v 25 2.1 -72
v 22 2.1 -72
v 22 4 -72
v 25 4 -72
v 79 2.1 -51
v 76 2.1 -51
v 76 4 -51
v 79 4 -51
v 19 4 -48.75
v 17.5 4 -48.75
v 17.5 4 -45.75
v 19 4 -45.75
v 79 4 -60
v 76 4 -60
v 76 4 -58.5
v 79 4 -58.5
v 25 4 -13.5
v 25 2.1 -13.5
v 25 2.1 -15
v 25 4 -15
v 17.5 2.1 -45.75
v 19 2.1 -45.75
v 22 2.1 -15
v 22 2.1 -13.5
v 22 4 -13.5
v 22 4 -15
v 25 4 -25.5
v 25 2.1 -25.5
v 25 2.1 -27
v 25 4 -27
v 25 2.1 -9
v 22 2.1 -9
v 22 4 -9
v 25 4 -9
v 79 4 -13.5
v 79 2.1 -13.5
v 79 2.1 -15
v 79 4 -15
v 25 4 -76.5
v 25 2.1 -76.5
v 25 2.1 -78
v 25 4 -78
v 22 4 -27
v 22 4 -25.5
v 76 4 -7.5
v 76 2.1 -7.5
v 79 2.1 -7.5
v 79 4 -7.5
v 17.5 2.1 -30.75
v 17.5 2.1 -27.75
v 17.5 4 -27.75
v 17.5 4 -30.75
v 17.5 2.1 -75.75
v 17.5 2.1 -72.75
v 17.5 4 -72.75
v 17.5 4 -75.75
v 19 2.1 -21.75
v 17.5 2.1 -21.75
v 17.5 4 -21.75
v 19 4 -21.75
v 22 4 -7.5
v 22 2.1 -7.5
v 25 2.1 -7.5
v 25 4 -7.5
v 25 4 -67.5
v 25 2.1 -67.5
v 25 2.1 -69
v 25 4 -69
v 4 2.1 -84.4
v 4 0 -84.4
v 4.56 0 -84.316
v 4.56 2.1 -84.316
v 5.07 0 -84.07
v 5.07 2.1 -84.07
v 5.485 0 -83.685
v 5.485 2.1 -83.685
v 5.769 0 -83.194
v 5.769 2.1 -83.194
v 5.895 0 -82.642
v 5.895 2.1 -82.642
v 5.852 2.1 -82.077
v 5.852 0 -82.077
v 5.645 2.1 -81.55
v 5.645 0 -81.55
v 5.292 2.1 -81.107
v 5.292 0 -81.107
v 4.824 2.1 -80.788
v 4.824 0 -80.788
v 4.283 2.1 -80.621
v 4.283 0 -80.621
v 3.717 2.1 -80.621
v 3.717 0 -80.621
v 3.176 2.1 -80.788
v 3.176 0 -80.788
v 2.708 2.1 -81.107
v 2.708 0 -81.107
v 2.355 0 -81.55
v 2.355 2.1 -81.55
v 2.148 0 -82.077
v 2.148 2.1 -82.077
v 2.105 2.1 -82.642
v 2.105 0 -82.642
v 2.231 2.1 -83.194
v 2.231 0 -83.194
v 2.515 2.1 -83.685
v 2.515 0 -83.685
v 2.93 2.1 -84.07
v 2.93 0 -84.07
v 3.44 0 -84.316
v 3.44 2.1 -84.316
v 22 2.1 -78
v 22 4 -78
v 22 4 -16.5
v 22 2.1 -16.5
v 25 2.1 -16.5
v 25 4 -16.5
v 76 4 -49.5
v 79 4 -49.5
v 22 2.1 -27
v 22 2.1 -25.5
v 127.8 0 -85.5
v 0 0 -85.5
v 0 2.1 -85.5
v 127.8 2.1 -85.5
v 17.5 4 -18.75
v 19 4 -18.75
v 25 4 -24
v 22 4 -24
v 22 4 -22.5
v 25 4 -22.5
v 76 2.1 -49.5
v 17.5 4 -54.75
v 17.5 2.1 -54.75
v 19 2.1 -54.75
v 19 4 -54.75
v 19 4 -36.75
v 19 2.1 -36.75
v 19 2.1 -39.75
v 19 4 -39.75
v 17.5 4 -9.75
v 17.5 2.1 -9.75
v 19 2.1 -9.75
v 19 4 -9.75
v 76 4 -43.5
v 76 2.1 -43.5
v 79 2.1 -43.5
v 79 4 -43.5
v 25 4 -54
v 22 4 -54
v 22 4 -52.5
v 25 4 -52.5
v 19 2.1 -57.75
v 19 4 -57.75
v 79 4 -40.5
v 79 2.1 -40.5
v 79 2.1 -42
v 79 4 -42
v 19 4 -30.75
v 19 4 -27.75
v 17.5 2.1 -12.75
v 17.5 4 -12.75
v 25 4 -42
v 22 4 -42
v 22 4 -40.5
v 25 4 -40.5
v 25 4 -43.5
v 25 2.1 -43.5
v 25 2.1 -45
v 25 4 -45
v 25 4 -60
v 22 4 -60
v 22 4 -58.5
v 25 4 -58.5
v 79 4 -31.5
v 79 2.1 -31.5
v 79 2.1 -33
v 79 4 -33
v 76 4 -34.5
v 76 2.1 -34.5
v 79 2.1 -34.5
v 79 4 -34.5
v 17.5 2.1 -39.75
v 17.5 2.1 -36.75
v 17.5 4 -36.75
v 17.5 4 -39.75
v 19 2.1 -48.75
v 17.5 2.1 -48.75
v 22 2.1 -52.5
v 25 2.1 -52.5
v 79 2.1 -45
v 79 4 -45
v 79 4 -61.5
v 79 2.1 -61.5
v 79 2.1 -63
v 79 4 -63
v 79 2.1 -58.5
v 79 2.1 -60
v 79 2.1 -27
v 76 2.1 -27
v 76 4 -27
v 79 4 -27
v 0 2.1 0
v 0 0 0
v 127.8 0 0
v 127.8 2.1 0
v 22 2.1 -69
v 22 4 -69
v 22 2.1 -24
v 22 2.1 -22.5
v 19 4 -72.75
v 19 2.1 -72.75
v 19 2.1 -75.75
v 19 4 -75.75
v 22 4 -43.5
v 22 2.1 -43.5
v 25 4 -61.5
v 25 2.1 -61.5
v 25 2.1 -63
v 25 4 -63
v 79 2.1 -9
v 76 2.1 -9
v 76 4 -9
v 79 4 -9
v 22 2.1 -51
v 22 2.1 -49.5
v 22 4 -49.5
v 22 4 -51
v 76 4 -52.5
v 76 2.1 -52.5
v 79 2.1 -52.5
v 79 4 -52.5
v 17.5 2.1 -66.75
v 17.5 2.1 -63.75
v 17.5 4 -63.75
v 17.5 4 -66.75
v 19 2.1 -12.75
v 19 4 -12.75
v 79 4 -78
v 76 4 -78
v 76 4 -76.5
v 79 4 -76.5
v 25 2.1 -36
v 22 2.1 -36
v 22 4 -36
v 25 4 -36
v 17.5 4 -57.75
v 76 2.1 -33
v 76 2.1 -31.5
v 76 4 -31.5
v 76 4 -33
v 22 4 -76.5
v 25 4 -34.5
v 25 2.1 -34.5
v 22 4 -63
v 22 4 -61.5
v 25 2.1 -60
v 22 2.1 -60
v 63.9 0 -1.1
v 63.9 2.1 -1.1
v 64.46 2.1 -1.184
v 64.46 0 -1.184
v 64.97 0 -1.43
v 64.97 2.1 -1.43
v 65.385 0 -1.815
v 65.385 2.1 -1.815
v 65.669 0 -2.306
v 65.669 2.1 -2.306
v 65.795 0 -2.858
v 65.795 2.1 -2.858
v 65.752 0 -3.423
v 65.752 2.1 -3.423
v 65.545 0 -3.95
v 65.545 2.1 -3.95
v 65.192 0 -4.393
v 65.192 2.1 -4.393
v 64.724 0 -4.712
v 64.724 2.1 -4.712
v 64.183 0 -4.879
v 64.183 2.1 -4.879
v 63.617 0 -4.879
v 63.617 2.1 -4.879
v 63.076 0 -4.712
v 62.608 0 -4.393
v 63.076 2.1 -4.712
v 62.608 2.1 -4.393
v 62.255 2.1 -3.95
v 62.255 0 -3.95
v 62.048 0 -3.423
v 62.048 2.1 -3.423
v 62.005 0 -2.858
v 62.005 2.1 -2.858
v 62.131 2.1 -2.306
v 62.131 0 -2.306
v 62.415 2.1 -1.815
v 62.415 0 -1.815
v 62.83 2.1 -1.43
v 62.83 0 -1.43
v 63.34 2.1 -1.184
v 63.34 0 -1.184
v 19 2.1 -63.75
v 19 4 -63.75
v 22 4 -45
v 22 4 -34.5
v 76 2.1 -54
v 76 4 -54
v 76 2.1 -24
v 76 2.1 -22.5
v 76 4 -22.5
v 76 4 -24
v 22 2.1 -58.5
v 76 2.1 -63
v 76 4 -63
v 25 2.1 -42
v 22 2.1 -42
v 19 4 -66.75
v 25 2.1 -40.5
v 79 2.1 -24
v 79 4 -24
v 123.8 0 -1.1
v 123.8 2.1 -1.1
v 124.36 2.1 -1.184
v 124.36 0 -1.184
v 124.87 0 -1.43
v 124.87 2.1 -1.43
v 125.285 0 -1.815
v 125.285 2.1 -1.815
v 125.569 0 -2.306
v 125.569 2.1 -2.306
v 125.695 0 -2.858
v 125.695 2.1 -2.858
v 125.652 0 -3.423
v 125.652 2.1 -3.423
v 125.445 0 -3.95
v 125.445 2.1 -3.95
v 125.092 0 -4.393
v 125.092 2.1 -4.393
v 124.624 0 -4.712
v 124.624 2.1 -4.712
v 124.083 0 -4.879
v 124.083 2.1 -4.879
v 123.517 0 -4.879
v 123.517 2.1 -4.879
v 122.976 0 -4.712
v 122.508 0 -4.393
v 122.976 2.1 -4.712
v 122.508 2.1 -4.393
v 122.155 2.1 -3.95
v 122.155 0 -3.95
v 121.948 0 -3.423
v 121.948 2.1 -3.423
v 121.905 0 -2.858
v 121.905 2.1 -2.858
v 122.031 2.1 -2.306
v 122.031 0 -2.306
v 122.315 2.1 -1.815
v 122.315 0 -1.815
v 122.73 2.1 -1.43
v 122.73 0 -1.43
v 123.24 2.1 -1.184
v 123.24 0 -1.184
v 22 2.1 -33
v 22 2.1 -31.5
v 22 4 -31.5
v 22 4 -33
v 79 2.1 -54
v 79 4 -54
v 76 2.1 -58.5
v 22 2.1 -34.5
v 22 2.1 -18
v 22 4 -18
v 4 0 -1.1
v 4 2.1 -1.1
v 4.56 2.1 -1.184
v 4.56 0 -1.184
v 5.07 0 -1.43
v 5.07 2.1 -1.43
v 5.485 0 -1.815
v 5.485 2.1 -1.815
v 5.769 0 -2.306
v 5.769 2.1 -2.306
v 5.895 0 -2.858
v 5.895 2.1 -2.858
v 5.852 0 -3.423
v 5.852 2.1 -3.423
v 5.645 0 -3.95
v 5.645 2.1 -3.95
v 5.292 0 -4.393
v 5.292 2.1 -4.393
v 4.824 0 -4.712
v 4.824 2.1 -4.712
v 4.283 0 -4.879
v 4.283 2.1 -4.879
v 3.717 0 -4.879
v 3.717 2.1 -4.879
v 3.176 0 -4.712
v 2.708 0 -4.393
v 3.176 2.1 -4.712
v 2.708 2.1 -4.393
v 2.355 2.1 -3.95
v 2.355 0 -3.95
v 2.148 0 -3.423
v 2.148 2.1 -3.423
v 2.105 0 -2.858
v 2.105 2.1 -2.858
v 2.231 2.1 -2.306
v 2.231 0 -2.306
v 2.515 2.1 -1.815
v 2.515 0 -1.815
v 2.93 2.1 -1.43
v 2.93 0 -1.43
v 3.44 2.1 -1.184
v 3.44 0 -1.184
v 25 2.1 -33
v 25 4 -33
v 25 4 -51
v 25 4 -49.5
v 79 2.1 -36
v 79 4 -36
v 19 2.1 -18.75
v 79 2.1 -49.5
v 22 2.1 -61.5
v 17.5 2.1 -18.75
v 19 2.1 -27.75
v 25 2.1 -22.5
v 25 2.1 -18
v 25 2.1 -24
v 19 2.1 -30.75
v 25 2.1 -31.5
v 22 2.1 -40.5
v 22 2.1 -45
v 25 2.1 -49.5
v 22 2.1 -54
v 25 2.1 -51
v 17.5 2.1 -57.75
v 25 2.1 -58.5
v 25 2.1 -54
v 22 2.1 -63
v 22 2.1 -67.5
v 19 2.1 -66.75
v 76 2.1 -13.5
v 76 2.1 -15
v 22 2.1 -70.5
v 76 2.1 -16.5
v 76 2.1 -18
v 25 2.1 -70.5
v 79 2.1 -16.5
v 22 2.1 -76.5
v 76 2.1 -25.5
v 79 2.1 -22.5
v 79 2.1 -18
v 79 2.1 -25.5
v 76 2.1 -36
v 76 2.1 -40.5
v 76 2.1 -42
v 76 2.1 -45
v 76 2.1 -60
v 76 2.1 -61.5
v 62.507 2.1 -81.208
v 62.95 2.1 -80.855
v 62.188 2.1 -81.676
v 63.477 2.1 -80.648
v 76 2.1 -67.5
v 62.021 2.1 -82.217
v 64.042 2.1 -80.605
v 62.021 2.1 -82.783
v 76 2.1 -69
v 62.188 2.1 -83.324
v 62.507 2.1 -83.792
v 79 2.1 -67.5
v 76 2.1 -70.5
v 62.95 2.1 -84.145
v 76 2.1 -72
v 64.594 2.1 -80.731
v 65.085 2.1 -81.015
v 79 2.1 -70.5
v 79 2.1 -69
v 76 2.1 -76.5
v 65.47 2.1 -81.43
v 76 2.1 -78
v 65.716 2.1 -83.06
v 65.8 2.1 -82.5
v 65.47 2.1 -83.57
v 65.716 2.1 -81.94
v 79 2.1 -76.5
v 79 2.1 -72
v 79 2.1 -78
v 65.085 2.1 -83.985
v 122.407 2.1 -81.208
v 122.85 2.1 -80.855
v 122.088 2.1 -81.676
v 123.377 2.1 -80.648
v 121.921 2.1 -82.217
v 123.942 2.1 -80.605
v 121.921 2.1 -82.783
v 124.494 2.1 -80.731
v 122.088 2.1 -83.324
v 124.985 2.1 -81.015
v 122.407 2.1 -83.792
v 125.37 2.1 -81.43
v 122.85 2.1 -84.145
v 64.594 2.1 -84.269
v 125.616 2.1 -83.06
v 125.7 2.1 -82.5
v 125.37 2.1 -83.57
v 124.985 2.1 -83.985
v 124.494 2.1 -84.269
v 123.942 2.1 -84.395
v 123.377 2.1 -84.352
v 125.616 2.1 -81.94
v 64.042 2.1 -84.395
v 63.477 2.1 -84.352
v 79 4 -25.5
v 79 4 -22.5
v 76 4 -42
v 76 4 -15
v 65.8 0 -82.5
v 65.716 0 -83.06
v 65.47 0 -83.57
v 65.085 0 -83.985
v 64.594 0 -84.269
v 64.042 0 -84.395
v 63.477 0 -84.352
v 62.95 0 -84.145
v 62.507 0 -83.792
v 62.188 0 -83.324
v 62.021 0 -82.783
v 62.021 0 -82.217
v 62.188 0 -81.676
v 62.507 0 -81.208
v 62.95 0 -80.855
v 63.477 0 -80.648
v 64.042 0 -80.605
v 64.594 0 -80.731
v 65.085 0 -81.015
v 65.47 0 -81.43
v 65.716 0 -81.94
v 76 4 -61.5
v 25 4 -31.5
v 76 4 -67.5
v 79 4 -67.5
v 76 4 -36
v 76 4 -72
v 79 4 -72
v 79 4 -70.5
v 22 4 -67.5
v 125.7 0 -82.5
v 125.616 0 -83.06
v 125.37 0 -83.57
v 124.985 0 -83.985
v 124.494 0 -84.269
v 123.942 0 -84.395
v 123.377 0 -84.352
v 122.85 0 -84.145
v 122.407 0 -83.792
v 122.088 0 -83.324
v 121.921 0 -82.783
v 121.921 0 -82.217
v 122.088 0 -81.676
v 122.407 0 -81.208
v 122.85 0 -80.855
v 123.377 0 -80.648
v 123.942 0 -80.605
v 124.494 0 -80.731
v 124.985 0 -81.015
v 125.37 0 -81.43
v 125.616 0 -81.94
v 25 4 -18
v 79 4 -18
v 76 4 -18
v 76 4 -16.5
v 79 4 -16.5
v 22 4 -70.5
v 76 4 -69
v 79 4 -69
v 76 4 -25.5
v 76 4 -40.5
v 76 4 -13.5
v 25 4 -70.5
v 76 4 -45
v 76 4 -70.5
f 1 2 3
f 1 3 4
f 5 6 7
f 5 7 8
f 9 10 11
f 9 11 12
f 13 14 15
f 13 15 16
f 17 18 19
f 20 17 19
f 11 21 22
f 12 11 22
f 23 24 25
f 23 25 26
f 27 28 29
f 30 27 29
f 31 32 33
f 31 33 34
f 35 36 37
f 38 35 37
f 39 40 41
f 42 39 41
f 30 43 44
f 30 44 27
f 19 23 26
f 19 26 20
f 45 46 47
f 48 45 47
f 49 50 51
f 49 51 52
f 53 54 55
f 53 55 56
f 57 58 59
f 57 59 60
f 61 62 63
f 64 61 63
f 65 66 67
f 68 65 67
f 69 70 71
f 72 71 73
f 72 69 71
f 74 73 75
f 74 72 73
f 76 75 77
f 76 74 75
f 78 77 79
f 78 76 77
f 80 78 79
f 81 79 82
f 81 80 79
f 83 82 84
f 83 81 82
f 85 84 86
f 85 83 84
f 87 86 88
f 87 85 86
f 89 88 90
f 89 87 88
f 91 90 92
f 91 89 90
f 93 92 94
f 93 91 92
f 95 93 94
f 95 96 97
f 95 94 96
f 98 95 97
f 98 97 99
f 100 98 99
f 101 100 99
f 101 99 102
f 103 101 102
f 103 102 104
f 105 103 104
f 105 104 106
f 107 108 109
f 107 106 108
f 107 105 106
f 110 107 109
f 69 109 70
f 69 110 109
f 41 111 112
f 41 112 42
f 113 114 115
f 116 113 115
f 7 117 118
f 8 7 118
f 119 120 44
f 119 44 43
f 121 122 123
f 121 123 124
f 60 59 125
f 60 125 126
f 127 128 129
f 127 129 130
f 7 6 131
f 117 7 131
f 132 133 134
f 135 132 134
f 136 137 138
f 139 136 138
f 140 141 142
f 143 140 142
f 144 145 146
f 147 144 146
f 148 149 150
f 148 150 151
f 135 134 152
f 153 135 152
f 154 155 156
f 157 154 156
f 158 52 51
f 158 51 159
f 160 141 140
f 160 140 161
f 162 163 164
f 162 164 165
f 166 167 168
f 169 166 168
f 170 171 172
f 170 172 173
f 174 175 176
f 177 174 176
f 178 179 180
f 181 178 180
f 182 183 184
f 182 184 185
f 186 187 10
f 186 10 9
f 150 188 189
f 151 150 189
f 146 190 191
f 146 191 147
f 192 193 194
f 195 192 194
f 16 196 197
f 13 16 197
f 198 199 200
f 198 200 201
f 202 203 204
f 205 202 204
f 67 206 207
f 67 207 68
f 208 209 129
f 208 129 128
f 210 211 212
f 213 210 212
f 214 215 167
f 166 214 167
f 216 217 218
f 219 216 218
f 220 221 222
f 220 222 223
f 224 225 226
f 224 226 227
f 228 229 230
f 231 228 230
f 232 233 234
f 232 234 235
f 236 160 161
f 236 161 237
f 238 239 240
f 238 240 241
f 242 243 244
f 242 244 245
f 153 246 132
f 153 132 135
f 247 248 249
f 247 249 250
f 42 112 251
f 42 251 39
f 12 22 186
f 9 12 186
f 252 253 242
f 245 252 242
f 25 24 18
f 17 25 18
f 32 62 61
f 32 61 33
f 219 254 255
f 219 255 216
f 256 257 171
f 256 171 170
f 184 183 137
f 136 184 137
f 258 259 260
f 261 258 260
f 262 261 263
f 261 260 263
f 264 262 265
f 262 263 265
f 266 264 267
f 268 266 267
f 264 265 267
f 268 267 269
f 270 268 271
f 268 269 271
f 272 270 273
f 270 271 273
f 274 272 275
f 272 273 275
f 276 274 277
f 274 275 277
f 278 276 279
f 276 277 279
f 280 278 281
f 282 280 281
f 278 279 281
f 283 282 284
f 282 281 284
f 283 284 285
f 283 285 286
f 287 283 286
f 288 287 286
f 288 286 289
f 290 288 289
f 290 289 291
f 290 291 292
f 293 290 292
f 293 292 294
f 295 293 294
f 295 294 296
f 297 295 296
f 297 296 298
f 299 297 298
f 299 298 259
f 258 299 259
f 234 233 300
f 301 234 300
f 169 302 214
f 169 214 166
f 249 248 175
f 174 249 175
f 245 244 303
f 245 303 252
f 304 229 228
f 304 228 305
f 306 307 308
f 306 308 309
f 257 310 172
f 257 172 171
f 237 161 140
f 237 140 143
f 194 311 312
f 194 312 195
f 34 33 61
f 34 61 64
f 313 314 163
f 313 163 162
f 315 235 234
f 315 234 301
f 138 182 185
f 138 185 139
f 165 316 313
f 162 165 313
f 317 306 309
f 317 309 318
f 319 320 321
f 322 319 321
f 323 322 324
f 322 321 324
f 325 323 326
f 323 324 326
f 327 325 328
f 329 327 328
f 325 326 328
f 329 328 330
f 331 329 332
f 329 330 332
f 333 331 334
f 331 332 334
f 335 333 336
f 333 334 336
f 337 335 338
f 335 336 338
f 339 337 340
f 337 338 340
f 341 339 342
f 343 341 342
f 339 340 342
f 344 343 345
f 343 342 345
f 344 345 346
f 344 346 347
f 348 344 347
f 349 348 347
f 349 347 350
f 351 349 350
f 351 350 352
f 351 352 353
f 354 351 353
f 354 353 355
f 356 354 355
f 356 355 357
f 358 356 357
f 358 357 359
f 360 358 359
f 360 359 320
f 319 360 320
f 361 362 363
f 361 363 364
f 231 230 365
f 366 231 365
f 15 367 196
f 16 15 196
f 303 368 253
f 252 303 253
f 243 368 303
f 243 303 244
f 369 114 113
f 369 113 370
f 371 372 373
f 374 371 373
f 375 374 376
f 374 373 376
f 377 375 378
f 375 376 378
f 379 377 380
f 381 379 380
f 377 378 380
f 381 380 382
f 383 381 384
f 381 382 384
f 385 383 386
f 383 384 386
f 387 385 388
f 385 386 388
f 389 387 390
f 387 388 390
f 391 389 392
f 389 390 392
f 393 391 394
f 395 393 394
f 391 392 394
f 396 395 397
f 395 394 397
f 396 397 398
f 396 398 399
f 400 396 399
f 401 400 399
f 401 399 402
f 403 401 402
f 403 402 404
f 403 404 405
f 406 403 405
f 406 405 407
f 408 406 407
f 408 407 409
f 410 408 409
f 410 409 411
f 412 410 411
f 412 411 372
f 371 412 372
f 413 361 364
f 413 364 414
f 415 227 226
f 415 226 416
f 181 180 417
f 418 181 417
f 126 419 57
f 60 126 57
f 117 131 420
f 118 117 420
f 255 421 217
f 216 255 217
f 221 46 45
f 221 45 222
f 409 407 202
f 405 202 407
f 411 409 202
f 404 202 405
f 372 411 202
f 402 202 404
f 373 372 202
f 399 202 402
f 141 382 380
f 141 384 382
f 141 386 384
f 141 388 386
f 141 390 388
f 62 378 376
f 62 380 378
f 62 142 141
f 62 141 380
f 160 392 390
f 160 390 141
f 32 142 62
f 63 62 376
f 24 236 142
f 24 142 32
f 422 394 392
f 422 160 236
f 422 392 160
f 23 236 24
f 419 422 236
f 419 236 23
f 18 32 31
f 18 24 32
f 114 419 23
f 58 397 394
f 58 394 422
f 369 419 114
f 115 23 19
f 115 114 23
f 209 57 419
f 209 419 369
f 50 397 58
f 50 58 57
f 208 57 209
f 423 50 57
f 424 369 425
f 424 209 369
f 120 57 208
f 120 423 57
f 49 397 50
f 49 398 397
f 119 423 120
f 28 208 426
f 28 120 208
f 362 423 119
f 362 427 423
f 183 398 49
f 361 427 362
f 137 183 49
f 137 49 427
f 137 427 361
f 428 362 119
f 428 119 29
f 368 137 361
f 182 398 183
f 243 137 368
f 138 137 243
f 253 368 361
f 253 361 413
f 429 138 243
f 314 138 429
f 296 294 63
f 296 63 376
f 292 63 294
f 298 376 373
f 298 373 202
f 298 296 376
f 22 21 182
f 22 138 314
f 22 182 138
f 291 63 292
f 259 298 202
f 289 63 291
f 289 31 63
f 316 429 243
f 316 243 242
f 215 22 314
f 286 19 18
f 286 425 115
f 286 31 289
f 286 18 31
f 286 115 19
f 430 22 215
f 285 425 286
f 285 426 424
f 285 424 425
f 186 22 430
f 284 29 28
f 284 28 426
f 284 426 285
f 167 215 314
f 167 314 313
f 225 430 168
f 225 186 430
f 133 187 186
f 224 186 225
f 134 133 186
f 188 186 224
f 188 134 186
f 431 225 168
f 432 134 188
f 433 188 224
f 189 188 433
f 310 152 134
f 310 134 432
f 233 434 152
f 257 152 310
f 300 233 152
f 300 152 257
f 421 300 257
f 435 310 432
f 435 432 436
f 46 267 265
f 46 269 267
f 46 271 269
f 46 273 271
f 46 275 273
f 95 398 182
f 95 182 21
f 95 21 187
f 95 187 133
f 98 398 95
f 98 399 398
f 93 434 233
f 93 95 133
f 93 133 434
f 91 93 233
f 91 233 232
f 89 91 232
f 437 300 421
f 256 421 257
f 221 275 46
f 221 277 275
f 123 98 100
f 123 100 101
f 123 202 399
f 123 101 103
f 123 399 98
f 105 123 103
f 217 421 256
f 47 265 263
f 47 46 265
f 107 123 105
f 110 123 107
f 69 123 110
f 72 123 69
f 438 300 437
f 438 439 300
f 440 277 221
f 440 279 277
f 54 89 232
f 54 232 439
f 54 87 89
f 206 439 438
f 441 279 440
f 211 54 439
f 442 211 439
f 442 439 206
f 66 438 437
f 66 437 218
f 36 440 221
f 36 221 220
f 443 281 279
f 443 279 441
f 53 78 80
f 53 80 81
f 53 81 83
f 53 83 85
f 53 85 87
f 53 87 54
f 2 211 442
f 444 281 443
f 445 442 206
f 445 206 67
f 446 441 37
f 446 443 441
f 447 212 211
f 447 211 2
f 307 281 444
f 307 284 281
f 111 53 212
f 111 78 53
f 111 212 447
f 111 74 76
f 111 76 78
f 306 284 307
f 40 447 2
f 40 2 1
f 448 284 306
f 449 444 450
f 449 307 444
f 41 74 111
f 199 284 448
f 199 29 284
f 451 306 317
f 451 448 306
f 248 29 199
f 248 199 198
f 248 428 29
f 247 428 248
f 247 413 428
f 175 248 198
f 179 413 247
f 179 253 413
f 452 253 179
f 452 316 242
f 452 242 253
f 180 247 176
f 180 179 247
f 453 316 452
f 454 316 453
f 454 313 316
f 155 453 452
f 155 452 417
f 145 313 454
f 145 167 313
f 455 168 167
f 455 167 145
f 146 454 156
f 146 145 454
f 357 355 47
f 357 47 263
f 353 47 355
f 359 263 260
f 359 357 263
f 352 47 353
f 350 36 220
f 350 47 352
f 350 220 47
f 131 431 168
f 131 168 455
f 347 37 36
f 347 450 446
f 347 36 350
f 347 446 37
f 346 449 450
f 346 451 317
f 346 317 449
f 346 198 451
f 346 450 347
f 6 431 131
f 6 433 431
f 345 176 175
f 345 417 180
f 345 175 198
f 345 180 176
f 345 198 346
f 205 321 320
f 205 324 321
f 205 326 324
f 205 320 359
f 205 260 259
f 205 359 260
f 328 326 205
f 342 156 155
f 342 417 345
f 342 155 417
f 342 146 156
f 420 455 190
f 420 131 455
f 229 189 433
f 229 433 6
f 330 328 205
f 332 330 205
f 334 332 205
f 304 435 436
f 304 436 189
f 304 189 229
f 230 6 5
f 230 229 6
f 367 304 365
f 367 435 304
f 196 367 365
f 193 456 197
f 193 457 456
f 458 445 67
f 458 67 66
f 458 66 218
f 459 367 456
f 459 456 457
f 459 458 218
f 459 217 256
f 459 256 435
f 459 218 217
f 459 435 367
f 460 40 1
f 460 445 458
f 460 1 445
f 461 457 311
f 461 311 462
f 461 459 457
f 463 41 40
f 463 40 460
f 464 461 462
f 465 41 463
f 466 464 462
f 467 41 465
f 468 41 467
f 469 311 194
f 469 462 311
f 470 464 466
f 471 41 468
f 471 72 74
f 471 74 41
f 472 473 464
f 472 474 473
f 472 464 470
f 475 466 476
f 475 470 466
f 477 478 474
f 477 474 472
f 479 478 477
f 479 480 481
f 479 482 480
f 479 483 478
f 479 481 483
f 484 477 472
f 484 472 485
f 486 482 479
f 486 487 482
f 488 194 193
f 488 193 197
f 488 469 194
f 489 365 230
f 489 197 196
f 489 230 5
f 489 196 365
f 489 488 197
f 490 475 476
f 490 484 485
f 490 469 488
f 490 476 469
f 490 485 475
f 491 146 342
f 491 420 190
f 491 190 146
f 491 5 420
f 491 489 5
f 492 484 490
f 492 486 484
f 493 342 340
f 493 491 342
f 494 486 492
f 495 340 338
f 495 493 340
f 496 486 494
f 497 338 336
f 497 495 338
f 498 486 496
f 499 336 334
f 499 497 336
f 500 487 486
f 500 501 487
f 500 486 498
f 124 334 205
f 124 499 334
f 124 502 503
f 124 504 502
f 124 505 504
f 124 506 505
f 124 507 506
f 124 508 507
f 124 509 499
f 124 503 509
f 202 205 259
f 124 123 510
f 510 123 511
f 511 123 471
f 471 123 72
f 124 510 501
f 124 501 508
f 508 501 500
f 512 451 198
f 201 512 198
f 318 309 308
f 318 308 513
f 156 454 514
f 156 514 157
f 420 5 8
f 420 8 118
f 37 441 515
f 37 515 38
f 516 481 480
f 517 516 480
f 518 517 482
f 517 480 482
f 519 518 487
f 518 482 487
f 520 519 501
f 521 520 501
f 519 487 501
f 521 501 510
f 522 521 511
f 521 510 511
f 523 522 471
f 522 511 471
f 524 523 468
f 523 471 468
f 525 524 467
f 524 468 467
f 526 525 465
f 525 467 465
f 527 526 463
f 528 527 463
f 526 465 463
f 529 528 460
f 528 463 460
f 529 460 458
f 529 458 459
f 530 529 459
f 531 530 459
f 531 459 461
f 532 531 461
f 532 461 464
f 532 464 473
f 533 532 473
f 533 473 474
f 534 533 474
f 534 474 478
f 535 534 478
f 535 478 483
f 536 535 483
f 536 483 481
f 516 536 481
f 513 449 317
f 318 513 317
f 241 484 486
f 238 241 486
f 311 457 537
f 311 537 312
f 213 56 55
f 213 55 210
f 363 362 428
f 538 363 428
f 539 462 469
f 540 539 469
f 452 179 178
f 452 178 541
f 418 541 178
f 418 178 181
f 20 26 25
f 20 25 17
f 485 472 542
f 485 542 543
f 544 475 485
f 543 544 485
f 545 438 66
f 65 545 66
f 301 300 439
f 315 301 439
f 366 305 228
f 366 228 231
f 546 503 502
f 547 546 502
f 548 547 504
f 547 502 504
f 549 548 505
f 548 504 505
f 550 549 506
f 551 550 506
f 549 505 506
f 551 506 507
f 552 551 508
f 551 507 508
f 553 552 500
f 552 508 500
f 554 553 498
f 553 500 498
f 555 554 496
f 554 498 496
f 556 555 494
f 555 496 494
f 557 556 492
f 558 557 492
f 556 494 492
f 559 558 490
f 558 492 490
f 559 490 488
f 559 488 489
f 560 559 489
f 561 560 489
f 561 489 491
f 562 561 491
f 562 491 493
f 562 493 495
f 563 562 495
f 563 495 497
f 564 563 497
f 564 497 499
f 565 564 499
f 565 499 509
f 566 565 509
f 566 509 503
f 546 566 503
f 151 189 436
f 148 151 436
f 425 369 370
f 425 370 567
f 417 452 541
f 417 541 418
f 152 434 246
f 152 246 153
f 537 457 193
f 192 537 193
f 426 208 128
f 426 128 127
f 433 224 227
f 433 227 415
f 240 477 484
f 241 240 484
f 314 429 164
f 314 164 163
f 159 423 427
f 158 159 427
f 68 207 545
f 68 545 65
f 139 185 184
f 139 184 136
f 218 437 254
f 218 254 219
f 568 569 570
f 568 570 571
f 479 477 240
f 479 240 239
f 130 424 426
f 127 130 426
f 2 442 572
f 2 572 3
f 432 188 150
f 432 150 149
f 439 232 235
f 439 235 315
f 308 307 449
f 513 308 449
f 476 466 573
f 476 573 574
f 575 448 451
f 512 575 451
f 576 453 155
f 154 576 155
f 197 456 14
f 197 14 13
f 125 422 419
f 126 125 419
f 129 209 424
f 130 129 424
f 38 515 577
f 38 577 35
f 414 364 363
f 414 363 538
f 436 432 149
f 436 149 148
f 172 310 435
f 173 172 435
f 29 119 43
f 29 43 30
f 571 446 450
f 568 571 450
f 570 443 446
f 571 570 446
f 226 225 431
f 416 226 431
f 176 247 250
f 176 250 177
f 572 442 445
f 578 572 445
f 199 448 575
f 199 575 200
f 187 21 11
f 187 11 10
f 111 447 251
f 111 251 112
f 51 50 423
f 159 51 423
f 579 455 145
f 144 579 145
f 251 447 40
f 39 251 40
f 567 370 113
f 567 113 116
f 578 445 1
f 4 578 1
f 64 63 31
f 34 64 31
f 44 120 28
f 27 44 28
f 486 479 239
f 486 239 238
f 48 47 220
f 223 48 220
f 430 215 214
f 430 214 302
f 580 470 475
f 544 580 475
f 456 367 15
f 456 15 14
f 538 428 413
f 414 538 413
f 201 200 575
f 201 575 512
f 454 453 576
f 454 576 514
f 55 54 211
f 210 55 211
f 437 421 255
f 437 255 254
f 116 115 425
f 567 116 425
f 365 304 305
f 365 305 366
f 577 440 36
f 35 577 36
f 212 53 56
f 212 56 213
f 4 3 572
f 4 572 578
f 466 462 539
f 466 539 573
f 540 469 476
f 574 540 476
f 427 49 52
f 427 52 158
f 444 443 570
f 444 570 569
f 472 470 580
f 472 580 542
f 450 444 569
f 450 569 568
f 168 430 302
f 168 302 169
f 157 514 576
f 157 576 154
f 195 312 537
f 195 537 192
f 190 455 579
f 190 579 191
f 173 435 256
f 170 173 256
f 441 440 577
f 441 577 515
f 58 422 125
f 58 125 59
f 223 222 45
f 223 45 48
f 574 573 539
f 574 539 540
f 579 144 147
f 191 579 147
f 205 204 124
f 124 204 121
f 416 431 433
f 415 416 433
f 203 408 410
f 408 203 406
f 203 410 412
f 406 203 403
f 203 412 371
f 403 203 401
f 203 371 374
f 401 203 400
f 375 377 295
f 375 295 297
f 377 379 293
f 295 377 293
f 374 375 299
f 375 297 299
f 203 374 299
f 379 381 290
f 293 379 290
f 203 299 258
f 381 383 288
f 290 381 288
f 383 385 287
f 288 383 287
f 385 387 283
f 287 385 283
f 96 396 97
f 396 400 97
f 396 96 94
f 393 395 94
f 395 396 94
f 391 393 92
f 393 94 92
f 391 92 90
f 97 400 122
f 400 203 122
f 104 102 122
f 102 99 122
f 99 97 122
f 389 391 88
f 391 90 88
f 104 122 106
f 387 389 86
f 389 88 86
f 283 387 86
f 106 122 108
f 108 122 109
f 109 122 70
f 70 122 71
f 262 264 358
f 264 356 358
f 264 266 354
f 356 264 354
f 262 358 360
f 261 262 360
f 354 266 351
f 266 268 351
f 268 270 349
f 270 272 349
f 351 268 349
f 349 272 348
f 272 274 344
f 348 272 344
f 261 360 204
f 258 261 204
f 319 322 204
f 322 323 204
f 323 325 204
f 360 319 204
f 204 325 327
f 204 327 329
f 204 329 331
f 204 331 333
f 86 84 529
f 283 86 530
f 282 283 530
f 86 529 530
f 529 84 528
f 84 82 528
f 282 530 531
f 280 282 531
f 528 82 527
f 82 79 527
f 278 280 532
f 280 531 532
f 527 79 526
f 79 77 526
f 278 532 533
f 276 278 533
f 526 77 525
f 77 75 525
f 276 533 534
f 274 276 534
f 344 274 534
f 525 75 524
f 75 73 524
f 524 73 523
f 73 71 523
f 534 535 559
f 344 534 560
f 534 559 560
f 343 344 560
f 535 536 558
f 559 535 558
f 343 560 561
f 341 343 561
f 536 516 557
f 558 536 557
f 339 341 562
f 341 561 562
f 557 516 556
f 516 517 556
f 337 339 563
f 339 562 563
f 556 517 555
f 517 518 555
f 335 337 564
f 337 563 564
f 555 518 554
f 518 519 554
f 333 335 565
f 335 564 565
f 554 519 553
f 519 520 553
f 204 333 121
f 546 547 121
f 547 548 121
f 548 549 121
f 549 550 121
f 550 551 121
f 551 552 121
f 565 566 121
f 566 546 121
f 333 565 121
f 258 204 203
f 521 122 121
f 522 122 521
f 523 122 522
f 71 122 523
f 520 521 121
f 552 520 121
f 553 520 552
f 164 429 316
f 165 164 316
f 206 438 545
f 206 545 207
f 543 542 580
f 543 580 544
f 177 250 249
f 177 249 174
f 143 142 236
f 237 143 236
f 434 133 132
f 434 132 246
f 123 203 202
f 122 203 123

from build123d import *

# Parameters (mm, degrees)
SKETCH1_W                 = 127.8
SKETCH1_H                 = 85.5
BOSS_EXTRUDE1_DEPTH       = 2.1
SKETCH2_R                 = 1.9
CUT_EXTRUDE1_DEPTH        = 154.777436576
LPATTERN1_COUNT           = 3
LPATTERN1_PITCH           = 59.9
MIRROR1_COPY_1_SKETCH_R   = 1.9
MIRROR1_COPY_1_DEPTH      = 154.777436576
MIRROR1_COPY_2_SKETCH_R   = 1.9
MIRROR1_COPY_2_DEPTH      = 154.777436576
SKETCH3_W                 = 3
SKETCH3_H                 = 1.5
BOSS_EXTRUDE2_DEPTH       = 1.9
LPATTERN2_COUNT           = 4
LPATTERN2_PITCH           = 9
MIRROR2_COPY_1_SKETCH_W   = 3
MIRROR2_COPY_1_SKETCH_H   = 1.5
MIRROR2_COPY_1_DEPTH      = 1.9
MIRROR2_COPY_2_SKETCH_W   = 3
MIRROR2_COPY_2_SKETCH_H   = 1.5
MIRROR2_COPY_2_DEPTH      = 1.9
MIRROR2_COPY_3_SKETCH_W   = 3
MIRROR2_COPY_3_SKETCH_H   = 1.5
MIRROR2_COPY_3_DEPTH      = 1.9
LPATTERN3_COUNT           = 2
LPATTERN3_PITCH           = 54
LPATTERN3_COPY_1_SKETCH_W = 3
LPATTERN3_COPY_1_SKETCH_H = 1.5
LPATTERN3_COPY_1_DEPTH    = 1.9
LPATTERN3_COPY_2_SKETCH_W = 3
LPATTERN3_COPY_2_SKETCH_H = 1.5
LPATTERN3_COPY_2_DEPTH    = 1.9
LPATTERN3_COPY_3_SKETCH_W = 3
LPATTERN3_COPY_3_SKETCH_H = 1.5
LPATTERN3_COPY_3_DEPTH    = 1.9
LPATTERN3_COPY_4_SKETCH_W = 3
LPATTERN3_COPY_4_SKETCH_H = 1.5
LPATTERN3_COPY_4_DEPTH    = 1.9
LPATTERN3_COPY_5_SKETCH_W = 3
LPATTERN3_COPY_5_SKETCH_H = 1.5
LPATTERN3_COPY_5_DEPTH    = 1.9
LPATTERN3_COPY_6_SKETCH_W = 3
LPATTERN3_COPY_6_SKETCH_H = 1.5
LPATTERN3_COPY_6_DEPTH    = 1.9
LPATTERN3_COPY_7_SKETCH_W = 3
LPATTERN3_COPY_7_SKETCH_H = 1.5
LPATTERN3_COPY_7_DEPTH    = 1.9
SKETCH4_W                 = 1.5
SKETCH4_H                 = 3
BOSS_EXTRUDE3_DEPTH       = 1.9
LPATTERN4_COUNT           = 8
LPATTERN4_PITCH           = 9


with BuildPart() as part:
    # Sketch1 → Boss-Extrude1 (new body)
    with BuildSketch(Plane(origin=(0, 0, 0), x_dir=(1, 0, 0), z_dir=(0, 1, 0))):
        with Locations((63.9, 42.75)):
            Rectangle(SKETCH1_W, SKETCH1_H)
    extrude(amount=BOSS_EXTRUDE1_DEPTH)

    # Sketch2 → Cut-Extrude1 (cut, through all)
    with BuildSketch(Plane(origin=(0, 2.1, 0), x_dir=(1, 0, 0), z_dir=(0, 1, 0))):
        with Locations(Location((4, 3, 0), (0, 0, 270))):
            Circle(SKETCH2_R)
    cut_extrude1 = extrude(amount=-CUT_EXTRUDE1_DEPTH, mode=Mode.SUBTRACT)

    # LPattern1: Cut-Extrude1 ×3
    with Locations(*[(i * LPATTERN1_PITCH, 0, 0) for i in range(1, LPATTERN1_COUNT)]):
        add(cut_extrude1, mode=Mode.SUBTRACT)

    # Mirror1: Cut-Extrude1 across plane
    add(cut_extrude1.mirror(Plane.XY.offset(-42.75)), mode=Mode.SUBTRACT)

    # Mirror1 copy 1 sketch → Mirror1 copy 1 (cut, through all)
    with BuildSketch(Plane(origin=(59.9, 2.1, -85.5), x_dir=(1, 0, 0), z_dir=(0, 1, 0))):
        with Locations((4, -3)):
            Circle(MIRROR1_COPY_1_SKETCH_R)
    extrude(amount=-MIRROR1_COPY_1_DEPTH, mode=Mode.SUBTRACT)

    # Mirror1 copy 2 sketch → Mirror1 copy 2 (cut, through all)
    with BuildSketch(Plane(origin=(119.8, 2.1, -85.5), x_dir=(1, 0, 0), z_dir=(0, 1, 0))):
        with Locations((4, -3)):
            Circle(MIRROR1_COPY_2_SKETCH_R)
    extrude(amount=-MIRROR1_COPY_2_DEPTH, mode=Mode.SUBTRACT)

    # Sketch3 → Boss-Extrude2 (add)
    with BuildSketch(Plane(origin=(0, 2.1, 0), x_dir=(1, 0, 0), z_dir=(0, 1, 0))):
        with Locations((77.5, 41.25)):
            Rectangle(SKETCH3_W, SKETCH3_H)
        with Locations((77.5, 35.25)):
            Rectangle(SKETCH3_W, SKETCH3_H)
    boss_extrude2 = extrude(amount=BOSS_EXTRUDE2_DEPTH)

    # LPattern2: Boss-Extrude2 ×4
    with Locations(*[(0, 0, i * LPATTERN2_PITCH) for i in range(1, LPATTERN2_COUNT)]):
        add(boss_extrude2)

    # Mirror2: Boss-Extrude2 across plane
    add(boss_extrude2.mirror(Plane.XY.offset(-42.75)))

    # Mirror2 copy 1 sketch → Mirror2 copy 1 (add)
    with BuildSketch(Plane(origin=(0, 2.1, -94.5), x_dir=(1, 0, 0), z_dir=(0, 1, 0))):
        with Locations((77.5, -41.25)):
            Rectangle(MIRROR2_COPY_1_SKETCH_W, MIRROR2_COPY_1_SKETCH_H)
        with Locations((77.5, -35.25)):
            Rectangle(MIRROR2_COPY_1_SKETCH_W, MIRROR2_COPY_1_SKETCH_H)
    extrude(amount=MIRROR2_COPY_1_DEPTH)

    # Mirror2 copy 2 sketch → Mirror2 copy 2 (add)
    with BuildSketch(Plane(origin=(0, 2.1, -103.5), x_dir=(1, 0, 0), z_dir=(0, 1, 0))):
        with Locations((77.5, -41.25)):
            Rectangle(MIRROR2_COPY_2_SKETCH_W, MIRROR2_COPY_2_SKETCH_H)
        with Locations((77.5, -35.25)):
            Rectangle(MIRROR2_COPY_2_SKETCH_W, MIRROR2_COPY_2_SKETCH_H)
    extrude(amount=MIRROR2_COPY_2_DEPTH)

    # Mirror2 copy 3 sketch → Mirror2 copy 3 (add)
    with BuildSketch(Plane(origin=(0, 2.1, -112.5), x_dir=(1, 0, 0), z_dir=(0, 1, 0))):
        with Locations((77.5, -41.25)):
            Rectangle(MIRROR2_COPY_3_SKETCH_W, MIRROR2_COPY_3_SKETCH_H)
        with Locations((77.5, -35.25)):
            Rectangle(MIRROR2_COPY_3_SKETCH_W, MIRROR2_COPY_3_SKETCH_H)
    extrude(amount=MIRROR2_COPY_3_DEPTH)

    # LPattern3: Boss-Extrude2 ×2
    with Locations(*[(-i * LPATTERN3_PITCH, 0, 0) for i in range(1, LPATTERN3_COUNT)]):
        add(boss_extrude2)

    # LPattern3 copy 1 sketch → LPattern3 copy 1 (add)
    with BuildSketch(Plane(origin=(-54, 2.1, 9), x_dir=(1, 0, 0), z_dir=(0, 1, 0))):
        with Locations((77.5, 41.25)):
            Rectangle(LPATTERN3_COPY_1_SKETCH_W, LPATTERN3_COPY_1_SKETCH_H)
        with Locations((77.5, 35.25)):
            Rectangle(LPATTERN3_COPY_1_SKETCH_W, LPATTERN3_COPY_1_SKETCH_H)
    extrude(amount=LPATTERN3_COPY_1_DEPTH)

    # LPattern3 copy 2 sketch → LPattern3 copy 2 (add)
    with BuildSketch(Plane(origin=(-54, 2.1, 18), x_dir=(1, 0, 0), z_dir=(0, 1, 0))):
        with Locations((77.5, 41.25)):
            Rectangle(LPATTERN3_COPY_2_SKETCH_W, LPATTERN3_COPY_2_SKETCH_H)
        with Locations((77.5, 35.25)):
            Rectangle(LPATTERN3_COPY_2_SKETCH_W, LPATTERN3_COPY_2_SKETCH_H)
    extrude(amount=LPATTERN3_COPY_2_DEPTH)

    # LPattern3 copy 3 sketch → LPattern3 copy 3 (add)
    with BuildSketch(Plane(origin=(-54, 2.1, 27), x_dir=(1, 0, 0), z_dir=(0, 1, 0))):
        with Locations((77.5, 41.25)):
            Rectangle(LPATTERN3_COPY_3_SKETCH_W, LPATTERN3_COPY_3_SKETCH_H)
        with Locations((77.5, 35.25)):
            Rectangle(LPATTERN3_COPY_3_SKETCH_W, LPATTERN3_COPY_3_SKETCH_H)
    extrude(amount=LPATTERN3_COPY_3_DEPTH)

    # LPattern3 copy 4 sketch → LPattern3 copy 4 (add)
    with BuildSketch(Plane(origin=(-54, 2.1, -85.5), x_dir=(1, 0, 0), z_dir=(0, 1, 0))):
        with Locations((77.5, -41.25)):
            Rectangle(LPATTERN3_COPY_4_SKETCH_W, LPATTERN3_COPY_4_SKETCH_H)
        with Locations((77.5, -35.25)):
            Rectangle(LPATTERN3_COPY_4_SKETCH_W, LPATTERN3_COPY_4_SKETCH_H)
    extrude(amount=LPATTERN3_COPY_4_DEPTH)

    # LPattern3 copy 5 sketch → LPattern3 copy 5 (add)
    with BuildSketch(Plane(origin=(-54, 2.1, -94.5), x_dir=(1, 0, 0), z_dir=(0, 1, 0))):
        with Locations((77.5, -41.25)):
            Rectangle(LPATTERN3_COPY_5_SKETCH_W, LPATTERN3_COPY_5_SKETCH_H)
        with Locations((77.5, -35.25)):
            Rectangle(LPATTERN3_COPY_5_SKETCH_W, LPATTERN3_COPY_5_SKETCH_H)
    extrude(amount=LPATTERN3_COPY_5_DEPTH)

    # LPattern3 copy 6 sketch → LPattern3 copy 6 (add)
    with BuildSketch(Plane(origin=(-54, 2.1, -103.5), x_dir=(1, 0, 0), z_dir=(0, 1, 0))):
        with Locations((77.5, -41.25)):
            Rectangle(LPATTERN3_COPY_6_SKETCH_W, LPATTERN3_COPY_6_SKETCH_H)
        with Locations((77.5, -35.25)):
            Rectangle(LPATTERN3_COPY_6_SKETCH_W, LPATTERN3_COPY_6_SKETCH_H)
    extrude(amount=LPATTERN3_COPY_6_DEPTH)

    # LPattern3 copy 7 sketch → LPattern3 copy 7 (add)
    with BuildSketch(Plane(origin=(-54, 2.1, -112.5), x_dir=(1, 0, 0), z_dir=(0, 1, 0))):
        with Locations((77.5, -41.25)):
            Rectangle(LPATTERN3_COPY_7_SKETCH_W, LPATTERN3_COPY_7_SKETCH_H)
        with Locations((77.5, -35.25)):
            Rectangle(LPATTERN3_COPY_7_SKETCH_W, LPATTERN3_COPY_7_SKETCH_H)
    extrude(amount=LPATTERN3_COPY_7_DEPTH)

    # Sketch4 → Boss-Extrude3 (add)
    with BuildSketch(Plane(origin=(0, 2.1, 0), x_dir=(1, 0, 0), z_dir=(0, 1, 0))):
        with Locations((18.25, 74.25)):
            Rectangle(SKETCH4_W, SKETCH4_H)
    boss_extrude3 = extrude(amount=BOSS_EXTRUDE3_DEPTH)

    # LPattern4: Boss-Extrude3 ×8
    with Locations(*[(0, 0, i * LPATTERN4_PITCH) for i in range(1, LPATTERN4_COUNT)]):
        add(boss_extrude3)


solid = part.part
